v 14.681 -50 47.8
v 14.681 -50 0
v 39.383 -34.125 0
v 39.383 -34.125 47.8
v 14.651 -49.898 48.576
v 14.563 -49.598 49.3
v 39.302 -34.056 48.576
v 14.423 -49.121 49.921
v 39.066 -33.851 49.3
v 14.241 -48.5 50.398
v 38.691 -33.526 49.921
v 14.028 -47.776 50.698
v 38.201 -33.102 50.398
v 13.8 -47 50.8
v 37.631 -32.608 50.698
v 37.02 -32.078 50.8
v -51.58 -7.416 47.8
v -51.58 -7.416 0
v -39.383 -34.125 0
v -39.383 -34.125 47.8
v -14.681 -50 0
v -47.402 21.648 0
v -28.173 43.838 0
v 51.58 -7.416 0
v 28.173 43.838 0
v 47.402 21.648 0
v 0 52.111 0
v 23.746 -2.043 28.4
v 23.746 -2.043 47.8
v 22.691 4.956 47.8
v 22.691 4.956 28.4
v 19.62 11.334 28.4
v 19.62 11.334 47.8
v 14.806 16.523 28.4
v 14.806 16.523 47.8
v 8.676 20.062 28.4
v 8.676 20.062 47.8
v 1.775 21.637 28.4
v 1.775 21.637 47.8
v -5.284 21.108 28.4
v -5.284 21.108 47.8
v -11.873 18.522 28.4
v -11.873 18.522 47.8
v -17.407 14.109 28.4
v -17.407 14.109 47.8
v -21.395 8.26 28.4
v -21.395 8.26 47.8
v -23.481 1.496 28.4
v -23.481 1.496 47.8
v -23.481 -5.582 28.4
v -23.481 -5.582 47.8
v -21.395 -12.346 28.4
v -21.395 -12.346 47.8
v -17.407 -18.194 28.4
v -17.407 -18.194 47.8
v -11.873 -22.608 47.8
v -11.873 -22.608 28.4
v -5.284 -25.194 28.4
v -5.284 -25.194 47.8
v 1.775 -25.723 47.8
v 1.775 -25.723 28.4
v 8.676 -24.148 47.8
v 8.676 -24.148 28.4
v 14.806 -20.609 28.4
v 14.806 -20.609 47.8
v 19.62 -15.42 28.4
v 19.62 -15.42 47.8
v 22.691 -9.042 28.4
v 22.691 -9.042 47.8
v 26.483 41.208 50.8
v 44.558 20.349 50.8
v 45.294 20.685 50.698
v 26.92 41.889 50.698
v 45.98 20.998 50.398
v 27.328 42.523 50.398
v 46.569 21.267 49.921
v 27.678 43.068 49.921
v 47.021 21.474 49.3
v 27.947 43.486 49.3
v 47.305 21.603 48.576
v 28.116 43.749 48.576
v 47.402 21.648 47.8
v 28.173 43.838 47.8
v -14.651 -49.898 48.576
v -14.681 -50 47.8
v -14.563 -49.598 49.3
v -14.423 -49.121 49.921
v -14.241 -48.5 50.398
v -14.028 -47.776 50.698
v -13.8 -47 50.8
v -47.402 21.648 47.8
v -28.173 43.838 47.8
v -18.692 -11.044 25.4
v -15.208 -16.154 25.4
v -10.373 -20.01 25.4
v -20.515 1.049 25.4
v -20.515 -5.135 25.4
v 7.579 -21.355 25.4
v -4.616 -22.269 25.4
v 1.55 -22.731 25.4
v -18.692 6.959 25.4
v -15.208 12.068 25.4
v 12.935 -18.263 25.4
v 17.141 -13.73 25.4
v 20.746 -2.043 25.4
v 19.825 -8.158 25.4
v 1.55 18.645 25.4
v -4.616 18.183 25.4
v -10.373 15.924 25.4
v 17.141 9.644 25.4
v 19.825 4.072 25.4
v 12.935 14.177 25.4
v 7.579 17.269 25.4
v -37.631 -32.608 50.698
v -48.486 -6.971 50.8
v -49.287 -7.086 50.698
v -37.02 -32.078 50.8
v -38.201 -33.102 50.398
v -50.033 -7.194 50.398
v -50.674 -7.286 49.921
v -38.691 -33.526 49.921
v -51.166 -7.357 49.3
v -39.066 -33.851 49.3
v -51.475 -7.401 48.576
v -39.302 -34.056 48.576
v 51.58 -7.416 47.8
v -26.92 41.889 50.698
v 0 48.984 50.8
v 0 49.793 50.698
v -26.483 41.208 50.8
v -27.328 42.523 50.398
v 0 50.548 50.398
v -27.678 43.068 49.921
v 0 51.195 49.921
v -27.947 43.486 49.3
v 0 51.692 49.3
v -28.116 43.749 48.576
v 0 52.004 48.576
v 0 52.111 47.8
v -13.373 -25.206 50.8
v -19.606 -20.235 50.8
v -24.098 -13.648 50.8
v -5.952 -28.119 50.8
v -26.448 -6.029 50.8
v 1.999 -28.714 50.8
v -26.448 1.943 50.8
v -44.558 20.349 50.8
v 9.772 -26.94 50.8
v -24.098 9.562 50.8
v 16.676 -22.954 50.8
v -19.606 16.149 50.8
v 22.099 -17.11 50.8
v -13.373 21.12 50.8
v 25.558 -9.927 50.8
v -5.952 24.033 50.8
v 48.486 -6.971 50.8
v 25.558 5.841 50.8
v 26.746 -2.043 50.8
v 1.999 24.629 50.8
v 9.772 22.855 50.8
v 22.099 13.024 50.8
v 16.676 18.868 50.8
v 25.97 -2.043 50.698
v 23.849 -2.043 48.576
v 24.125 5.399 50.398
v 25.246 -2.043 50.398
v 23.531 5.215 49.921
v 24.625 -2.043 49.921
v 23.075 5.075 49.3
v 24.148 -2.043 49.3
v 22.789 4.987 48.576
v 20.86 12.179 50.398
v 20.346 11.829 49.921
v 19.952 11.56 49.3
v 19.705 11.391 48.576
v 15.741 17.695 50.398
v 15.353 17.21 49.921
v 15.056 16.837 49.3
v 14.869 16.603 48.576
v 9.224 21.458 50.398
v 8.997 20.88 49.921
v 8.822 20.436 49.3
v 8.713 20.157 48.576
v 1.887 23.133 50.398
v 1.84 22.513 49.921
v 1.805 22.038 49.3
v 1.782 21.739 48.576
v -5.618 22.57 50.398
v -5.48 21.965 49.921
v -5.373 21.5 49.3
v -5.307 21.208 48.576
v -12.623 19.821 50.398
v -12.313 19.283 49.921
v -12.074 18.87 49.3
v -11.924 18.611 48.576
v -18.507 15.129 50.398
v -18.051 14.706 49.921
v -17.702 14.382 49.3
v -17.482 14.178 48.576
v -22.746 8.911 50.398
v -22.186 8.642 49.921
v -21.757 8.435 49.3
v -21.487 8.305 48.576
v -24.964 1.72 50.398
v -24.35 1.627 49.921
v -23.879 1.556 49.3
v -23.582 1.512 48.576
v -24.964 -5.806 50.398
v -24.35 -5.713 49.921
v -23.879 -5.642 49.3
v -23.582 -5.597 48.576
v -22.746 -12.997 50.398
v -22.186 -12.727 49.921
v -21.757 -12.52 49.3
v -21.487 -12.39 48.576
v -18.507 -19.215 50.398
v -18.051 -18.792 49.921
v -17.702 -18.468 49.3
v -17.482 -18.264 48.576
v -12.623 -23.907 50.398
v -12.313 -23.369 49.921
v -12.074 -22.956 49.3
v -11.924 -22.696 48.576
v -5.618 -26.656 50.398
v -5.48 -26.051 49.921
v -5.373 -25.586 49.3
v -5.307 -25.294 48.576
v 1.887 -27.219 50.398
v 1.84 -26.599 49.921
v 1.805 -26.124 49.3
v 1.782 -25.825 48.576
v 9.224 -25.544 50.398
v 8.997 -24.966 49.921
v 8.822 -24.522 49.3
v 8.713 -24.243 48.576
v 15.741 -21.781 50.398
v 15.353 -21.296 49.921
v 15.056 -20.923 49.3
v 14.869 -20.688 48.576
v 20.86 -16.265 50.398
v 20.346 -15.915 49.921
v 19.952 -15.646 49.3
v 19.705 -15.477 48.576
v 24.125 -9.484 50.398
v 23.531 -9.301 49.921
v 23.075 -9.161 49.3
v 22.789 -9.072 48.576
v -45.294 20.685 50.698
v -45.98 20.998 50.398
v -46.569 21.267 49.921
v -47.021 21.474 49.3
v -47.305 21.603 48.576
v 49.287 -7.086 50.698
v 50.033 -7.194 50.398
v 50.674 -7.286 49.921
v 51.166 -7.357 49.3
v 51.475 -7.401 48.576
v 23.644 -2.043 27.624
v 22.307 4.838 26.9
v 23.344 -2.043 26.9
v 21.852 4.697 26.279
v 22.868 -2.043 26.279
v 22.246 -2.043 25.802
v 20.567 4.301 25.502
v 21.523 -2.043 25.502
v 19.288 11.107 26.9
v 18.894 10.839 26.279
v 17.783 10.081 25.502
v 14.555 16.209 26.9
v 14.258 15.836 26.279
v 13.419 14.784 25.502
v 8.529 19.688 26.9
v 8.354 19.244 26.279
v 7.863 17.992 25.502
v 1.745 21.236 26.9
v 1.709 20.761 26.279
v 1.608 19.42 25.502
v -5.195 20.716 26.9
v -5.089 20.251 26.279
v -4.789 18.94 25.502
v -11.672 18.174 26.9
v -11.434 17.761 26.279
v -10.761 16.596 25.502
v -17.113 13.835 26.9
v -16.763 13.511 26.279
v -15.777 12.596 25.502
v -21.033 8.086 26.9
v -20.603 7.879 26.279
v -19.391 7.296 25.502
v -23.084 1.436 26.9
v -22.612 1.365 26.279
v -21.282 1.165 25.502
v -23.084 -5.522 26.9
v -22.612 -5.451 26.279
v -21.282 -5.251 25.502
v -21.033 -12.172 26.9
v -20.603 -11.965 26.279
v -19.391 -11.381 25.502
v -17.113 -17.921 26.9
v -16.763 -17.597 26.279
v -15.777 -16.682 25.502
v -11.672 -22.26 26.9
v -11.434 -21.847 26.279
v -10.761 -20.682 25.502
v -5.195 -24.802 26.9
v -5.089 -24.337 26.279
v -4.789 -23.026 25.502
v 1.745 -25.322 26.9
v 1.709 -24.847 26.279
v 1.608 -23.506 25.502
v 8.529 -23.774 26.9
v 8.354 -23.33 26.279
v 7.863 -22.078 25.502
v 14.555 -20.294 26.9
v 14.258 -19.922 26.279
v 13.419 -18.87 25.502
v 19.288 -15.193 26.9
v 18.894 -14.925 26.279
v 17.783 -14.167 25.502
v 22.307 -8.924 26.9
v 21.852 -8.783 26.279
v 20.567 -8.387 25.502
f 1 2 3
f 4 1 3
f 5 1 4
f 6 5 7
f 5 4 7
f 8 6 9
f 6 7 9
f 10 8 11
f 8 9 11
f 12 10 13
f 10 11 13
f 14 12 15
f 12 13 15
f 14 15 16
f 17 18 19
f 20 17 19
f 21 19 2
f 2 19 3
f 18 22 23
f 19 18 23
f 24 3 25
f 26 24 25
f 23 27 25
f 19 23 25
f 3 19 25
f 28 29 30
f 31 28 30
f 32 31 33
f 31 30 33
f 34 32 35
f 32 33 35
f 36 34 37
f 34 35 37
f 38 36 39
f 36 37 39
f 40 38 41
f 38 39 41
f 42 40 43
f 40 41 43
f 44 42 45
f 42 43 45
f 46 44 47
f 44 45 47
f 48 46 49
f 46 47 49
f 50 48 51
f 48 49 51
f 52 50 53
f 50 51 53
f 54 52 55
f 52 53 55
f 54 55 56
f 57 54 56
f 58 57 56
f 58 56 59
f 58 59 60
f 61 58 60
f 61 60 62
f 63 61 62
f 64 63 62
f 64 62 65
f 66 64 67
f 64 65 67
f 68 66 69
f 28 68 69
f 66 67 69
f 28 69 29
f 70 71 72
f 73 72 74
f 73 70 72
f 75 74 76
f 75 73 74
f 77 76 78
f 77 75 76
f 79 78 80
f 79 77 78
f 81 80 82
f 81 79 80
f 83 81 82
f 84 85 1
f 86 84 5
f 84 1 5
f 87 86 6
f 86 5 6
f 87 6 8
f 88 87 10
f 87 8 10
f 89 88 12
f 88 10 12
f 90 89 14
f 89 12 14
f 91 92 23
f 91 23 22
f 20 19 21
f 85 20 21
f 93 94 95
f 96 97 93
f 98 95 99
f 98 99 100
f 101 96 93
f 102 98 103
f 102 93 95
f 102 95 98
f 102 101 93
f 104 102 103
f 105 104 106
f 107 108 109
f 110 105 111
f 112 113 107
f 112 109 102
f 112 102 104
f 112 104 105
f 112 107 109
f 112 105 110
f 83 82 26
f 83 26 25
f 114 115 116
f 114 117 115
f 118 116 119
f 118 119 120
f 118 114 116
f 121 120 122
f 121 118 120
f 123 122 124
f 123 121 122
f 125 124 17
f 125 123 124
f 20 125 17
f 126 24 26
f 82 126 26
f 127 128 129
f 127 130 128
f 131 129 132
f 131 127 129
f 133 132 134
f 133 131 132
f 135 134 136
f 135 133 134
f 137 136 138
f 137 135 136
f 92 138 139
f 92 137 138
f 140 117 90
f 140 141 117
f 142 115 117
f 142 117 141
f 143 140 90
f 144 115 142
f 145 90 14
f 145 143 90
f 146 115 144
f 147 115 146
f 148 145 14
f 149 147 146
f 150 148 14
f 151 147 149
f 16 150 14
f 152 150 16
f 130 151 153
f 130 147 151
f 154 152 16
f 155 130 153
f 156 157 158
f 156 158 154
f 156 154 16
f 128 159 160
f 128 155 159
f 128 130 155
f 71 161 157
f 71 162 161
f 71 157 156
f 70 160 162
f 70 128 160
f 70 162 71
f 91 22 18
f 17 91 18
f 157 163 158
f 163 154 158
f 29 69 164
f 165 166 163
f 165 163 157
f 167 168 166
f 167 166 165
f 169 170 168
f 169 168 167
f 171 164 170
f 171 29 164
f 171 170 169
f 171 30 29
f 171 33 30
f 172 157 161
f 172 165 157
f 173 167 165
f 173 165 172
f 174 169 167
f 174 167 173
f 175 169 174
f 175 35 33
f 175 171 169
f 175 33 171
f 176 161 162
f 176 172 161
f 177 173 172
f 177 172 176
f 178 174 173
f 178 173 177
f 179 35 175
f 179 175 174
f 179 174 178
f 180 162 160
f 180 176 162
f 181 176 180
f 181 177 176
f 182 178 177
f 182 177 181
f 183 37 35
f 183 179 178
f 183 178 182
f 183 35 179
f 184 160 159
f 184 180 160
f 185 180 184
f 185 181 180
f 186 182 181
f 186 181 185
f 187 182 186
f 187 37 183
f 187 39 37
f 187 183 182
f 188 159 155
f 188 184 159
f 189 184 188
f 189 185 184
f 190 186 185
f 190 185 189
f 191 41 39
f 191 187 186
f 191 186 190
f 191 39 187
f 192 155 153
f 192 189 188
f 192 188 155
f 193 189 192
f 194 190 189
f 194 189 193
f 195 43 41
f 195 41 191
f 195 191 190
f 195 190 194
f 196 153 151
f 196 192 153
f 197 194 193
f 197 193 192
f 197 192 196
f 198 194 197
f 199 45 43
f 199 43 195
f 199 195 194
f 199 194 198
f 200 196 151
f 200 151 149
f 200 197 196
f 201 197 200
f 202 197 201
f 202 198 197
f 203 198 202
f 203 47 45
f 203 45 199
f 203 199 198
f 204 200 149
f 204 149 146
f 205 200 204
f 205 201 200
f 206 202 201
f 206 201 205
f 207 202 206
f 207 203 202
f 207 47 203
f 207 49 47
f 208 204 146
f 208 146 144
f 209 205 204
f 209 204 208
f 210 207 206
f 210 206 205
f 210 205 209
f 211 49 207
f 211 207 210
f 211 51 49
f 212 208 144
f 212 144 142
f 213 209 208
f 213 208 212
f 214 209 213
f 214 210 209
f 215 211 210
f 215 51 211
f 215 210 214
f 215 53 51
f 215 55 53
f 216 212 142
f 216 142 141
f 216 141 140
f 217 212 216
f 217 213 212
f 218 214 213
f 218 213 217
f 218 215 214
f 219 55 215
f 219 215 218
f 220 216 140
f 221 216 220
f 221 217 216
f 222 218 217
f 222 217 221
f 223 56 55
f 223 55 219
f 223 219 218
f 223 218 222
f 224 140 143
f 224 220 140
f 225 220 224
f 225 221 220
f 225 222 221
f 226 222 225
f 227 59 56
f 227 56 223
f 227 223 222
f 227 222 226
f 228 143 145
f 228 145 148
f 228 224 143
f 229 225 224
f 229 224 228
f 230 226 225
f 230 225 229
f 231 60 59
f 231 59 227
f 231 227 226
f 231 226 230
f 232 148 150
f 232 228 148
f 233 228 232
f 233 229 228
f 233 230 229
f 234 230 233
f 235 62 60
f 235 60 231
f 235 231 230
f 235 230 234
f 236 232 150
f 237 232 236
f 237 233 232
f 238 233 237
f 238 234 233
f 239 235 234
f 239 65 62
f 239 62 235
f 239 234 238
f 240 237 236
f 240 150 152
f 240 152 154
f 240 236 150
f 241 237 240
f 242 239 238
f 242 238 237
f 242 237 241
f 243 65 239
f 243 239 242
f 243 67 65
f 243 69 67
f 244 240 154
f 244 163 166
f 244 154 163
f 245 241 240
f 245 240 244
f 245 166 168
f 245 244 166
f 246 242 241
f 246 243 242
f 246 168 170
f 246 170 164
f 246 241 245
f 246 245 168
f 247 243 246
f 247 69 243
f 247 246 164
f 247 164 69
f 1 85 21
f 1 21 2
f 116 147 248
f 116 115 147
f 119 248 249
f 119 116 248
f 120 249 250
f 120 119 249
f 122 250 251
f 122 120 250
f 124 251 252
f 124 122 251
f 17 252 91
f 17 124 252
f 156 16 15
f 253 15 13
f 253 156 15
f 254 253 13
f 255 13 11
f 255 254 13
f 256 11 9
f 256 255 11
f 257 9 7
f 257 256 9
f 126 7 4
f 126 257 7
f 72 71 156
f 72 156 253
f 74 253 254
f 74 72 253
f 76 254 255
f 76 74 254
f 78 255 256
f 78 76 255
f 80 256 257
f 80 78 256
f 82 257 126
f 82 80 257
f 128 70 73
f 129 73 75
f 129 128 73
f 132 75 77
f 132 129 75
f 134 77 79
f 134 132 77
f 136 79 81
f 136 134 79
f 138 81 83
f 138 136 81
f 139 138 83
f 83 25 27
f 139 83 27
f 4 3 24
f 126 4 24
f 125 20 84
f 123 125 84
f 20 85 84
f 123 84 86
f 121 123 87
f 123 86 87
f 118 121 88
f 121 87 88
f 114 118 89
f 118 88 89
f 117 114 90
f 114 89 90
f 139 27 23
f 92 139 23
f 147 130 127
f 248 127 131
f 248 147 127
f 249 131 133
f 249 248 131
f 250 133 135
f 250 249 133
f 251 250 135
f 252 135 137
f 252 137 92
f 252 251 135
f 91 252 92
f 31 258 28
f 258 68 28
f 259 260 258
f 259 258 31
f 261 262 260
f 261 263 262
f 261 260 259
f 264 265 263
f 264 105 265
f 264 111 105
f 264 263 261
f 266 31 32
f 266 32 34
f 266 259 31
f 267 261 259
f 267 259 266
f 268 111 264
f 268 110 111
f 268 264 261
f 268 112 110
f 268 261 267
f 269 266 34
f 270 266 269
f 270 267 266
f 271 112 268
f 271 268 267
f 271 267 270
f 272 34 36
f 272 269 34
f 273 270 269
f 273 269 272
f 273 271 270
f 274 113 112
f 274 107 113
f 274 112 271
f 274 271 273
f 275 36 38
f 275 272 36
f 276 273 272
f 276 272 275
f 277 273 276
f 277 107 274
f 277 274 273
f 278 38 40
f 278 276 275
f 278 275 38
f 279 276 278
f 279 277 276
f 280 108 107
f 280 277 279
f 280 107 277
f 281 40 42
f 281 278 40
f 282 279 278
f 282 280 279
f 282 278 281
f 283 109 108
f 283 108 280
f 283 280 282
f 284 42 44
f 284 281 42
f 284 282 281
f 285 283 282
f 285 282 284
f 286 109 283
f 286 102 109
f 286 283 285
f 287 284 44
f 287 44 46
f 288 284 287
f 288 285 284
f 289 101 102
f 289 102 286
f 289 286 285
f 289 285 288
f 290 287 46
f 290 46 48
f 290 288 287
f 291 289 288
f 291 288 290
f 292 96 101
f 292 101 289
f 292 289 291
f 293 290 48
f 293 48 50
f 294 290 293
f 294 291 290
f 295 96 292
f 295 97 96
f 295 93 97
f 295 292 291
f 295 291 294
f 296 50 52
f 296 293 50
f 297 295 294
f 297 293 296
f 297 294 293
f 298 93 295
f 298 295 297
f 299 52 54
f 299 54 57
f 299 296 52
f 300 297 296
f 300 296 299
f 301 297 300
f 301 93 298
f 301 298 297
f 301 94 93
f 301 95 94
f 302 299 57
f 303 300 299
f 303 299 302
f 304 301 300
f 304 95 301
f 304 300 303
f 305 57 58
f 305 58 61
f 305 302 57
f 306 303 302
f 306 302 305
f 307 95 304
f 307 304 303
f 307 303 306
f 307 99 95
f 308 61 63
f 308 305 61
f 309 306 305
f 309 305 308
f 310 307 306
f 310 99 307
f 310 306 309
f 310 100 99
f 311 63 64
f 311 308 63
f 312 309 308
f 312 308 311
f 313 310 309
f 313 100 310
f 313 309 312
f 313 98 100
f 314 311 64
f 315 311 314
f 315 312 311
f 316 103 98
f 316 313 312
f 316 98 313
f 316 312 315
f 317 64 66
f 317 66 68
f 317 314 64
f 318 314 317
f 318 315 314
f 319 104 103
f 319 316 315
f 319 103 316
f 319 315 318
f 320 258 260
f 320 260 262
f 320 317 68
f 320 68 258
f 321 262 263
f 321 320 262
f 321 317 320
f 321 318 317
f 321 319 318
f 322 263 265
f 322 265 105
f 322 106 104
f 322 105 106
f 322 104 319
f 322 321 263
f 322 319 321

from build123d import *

# Parameters (mm, degrees)
F1_DEPTH = 50.8
F2_R     = 23.7463385983
F3_DEPTH = 25.4
F4_R     = 3


with BuildPart() as f1:
    # F0 (on Top) → F1 (new body)
    with BuildSketch(Plane.XY):
        Polygon((-14.6813246469, -50), (14.6813246469, -50), (39.3827570986, -34.1253532831), (51.5804424368, -7.4161480171), (47.4017017513, 21.6476318444), (28.1732556841, 43.8384415501), (0, 52.1108558113), (-28.1732556841, 43.8384415501), (-47.4017017513, 21.6476318444), (-51.5804424368, -7.4161480171), (-39.3827570986, -34.1253532831), align=None)
    extrude(amount=F1_DEPTH)

    # F2 (on face) → F3 (cut)
    with BuildSketch(Plane.XY.offset(50.8)):
        with Locations((0, -2.0428874996)):
            Circle(F2_R)
    extrude(amount=-F3_DEPTH, mode=Mode.SUBTRACT)

    # F4
    f4_edges = [f1.edges().sort_by_distance(p)[0] for p in [
        (-23.746339, -2.042887, 25.4),
        (-23.746339, -2.042887, 50.8),
        (0, -50, 50.8),
        (-27.032041, -42.062677, 50.8),
        (27.032041, -42.062677, 50.8),
        (-45.4816, -20.770751, 50.8),
        (45.4816, -20.770751, 50.8),
        (-49.491072, 7.115742, 50.8),
        (49.491072, 7.115742, 50.8),
        (-37.787479, 32.743037, 50.8),
        (37.787479, 32.743037, 50.8),
        (-14.086628, 47.974649, 50.8),
        (14.086628, 47.974649, 50.8),
    ]]
    fillet(f4_edges, radius=F4_R)


solid = f1.part
